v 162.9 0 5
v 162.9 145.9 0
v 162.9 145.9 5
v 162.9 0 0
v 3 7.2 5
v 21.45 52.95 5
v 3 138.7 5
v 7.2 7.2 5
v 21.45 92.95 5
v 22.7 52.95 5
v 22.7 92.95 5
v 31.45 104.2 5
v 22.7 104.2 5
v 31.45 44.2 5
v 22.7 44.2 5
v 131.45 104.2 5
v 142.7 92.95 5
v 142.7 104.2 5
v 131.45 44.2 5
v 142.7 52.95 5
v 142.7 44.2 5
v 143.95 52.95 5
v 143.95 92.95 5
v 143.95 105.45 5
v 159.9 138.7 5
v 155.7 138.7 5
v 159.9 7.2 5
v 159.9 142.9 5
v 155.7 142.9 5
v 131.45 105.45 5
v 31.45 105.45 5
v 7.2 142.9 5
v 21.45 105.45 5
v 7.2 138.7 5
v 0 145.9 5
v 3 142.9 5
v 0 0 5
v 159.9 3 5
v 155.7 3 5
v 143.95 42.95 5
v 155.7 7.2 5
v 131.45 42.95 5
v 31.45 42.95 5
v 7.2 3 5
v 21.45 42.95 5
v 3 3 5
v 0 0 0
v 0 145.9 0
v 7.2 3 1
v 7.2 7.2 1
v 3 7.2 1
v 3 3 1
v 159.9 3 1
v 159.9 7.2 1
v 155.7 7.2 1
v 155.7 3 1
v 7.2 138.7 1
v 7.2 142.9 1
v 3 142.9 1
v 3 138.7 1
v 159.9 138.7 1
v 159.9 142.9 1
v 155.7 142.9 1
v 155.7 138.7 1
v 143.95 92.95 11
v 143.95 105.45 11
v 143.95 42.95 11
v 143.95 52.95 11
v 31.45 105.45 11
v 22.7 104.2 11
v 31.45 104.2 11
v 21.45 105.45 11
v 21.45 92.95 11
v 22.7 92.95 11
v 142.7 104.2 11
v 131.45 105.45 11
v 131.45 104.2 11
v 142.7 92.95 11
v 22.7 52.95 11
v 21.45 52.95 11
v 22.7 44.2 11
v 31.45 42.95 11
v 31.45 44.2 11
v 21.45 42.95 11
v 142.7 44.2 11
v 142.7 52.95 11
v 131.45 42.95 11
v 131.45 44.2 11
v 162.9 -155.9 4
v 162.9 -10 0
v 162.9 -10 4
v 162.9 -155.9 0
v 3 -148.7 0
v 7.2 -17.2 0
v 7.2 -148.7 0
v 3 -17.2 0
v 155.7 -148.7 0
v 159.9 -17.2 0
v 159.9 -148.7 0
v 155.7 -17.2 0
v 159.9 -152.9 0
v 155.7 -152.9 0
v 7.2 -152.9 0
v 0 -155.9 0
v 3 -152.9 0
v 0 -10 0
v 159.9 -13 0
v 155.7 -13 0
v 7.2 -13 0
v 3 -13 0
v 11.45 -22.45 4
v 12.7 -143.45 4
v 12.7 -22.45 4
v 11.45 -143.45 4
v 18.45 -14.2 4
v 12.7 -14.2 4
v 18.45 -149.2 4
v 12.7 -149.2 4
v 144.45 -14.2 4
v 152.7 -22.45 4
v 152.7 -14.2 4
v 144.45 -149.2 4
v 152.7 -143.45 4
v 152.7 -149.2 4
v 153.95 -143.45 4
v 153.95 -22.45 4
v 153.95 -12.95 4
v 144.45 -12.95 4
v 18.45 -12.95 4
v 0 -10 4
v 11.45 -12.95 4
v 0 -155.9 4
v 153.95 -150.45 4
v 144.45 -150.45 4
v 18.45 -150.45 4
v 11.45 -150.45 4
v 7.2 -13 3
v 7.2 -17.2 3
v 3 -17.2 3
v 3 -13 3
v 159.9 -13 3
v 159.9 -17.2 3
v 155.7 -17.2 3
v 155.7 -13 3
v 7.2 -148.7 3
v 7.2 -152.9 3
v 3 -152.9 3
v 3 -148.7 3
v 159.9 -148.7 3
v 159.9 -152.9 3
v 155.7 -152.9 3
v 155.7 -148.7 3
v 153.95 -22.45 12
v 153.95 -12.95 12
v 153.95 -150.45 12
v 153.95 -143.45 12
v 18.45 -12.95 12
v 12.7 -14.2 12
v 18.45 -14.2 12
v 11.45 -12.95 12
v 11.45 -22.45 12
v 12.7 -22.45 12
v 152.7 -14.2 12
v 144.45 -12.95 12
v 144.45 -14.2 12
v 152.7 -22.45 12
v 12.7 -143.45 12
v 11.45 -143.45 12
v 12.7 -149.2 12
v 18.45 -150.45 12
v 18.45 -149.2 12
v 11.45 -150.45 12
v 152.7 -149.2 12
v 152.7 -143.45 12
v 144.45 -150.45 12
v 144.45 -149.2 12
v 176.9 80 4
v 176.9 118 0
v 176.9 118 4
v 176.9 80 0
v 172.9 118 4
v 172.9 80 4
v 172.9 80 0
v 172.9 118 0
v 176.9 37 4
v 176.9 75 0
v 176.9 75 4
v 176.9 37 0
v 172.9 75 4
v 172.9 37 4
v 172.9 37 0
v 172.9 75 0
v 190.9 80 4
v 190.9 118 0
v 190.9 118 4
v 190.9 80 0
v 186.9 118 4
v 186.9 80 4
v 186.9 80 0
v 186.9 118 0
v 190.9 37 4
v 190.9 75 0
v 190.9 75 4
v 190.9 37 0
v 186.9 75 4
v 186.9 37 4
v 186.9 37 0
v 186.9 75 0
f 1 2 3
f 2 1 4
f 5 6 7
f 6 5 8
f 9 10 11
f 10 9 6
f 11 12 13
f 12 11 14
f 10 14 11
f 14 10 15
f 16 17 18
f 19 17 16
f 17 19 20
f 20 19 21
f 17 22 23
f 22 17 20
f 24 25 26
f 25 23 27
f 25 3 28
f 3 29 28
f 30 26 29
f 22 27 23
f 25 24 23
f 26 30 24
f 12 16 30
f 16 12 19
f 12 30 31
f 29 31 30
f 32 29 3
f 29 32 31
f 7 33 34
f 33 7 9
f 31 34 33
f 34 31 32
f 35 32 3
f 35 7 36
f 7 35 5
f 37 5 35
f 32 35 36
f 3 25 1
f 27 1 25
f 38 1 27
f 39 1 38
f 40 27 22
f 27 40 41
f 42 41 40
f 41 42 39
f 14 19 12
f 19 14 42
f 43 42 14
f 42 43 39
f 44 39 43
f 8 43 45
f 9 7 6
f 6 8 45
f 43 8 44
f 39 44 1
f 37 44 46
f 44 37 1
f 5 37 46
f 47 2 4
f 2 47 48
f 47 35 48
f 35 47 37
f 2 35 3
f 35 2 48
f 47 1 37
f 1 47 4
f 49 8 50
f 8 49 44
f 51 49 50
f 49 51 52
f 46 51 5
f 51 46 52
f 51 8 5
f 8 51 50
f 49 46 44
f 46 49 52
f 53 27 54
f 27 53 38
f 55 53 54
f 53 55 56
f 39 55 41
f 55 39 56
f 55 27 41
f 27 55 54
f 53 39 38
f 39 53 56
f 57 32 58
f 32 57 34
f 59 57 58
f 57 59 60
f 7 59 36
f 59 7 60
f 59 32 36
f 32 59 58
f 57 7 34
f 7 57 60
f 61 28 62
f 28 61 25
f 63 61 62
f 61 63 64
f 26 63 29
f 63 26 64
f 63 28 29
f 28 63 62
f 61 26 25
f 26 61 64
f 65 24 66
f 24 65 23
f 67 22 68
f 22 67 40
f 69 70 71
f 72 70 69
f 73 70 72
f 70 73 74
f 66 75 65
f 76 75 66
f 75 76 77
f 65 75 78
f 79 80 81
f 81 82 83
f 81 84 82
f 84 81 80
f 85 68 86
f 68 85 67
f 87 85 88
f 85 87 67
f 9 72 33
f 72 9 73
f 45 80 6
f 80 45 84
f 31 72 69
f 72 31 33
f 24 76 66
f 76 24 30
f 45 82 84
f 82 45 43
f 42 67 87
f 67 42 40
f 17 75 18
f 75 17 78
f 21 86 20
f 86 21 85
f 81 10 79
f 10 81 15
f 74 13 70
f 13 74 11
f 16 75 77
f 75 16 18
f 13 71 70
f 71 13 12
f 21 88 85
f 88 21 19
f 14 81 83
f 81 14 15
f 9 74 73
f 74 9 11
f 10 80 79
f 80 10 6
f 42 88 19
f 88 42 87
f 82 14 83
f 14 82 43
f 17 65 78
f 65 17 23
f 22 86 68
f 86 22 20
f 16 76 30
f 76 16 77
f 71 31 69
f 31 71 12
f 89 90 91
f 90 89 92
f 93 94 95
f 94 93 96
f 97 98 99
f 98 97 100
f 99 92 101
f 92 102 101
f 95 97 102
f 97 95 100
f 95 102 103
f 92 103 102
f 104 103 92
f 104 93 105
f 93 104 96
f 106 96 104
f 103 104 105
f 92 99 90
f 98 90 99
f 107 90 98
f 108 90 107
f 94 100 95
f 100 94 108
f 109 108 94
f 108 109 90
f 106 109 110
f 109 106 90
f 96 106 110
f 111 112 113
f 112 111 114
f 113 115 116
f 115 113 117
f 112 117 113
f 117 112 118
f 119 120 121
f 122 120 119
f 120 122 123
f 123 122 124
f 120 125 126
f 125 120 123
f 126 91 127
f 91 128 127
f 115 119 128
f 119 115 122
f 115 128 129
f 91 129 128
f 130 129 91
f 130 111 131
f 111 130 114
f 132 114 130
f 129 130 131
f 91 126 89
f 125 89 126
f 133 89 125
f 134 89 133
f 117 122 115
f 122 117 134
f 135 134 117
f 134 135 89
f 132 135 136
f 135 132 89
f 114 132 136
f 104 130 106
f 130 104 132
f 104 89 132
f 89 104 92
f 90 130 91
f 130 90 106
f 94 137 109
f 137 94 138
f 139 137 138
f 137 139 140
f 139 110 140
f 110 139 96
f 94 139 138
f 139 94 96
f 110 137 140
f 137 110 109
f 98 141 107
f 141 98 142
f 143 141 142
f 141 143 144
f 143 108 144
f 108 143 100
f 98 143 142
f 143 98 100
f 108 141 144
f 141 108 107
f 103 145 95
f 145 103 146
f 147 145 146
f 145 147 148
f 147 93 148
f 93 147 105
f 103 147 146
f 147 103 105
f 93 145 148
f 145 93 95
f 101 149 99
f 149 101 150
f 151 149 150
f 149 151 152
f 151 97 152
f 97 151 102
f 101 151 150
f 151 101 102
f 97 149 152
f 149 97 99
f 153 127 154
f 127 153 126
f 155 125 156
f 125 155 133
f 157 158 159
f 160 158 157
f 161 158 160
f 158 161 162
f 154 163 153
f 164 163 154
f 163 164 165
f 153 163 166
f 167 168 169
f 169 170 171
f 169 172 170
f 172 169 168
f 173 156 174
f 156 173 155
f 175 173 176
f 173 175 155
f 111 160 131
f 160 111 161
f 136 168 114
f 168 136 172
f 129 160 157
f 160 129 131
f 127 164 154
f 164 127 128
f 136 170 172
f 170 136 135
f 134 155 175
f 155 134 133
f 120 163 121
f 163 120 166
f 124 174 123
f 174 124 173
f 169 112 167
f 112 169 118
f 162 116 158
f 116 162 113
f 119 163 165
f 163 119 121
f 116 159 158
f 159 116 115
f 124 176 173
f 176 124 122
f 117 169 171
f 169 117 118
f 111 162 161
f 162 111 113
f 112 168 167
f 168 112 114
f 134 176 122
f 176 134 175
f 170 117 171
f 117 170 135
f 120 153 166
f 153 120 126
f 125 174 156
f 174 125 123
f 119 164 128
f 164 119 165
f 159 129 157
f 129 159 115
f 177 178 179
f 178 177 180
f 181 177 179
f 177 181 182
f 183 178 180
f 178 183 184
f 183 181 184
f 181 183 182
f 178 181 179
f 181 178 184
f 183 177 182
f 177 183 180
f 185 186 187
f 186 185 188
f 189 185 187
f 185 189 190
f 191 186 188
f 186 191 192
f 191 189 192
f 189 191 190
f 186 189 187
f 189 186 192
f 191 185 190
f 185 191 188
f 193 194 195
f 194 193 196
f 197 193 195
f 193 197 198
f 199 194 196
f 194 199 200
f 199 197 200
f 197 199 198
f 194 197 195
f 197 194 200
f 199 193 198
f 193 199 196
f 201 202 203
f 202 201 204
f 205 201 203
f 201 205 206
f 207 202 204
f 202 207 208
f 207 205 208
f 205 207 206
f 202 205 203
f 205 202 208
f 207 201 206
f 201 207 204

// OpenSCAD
// Brian's Micro Shelving

// Pick which parts to create
part = "all";  // [all:All,base:Base,top_shelf:Top Shelf,legs:Legs]
retaining_wall_width = 1.25;

/* [Base Shelf and Device Dimensions] */
// Base Shelf Device Width
bd_width = 120;
// Base Shelf Device Depth
bd_depth = 60;
// Base Shelf Device Height
bd_height = 30;
// Base Shelf Device Retaining Wall (true or false)
bd_retaining_wall = 0; //[0:True,1:False]
// Base Shelf Device Retaining Wall Length
bd_retaining_wall_length = 10;
// Base Shelf Device Retaining Wall Height
bd_retaining_wall_height = 6;

/* [Top shelf and Device Dimensions] */
// Top shelf Device Width
tsd_width = 140;
// Top shelf Device Depth
tsd_depth = 135;
// Top shelf Device Height
tsd_height =  25;
// Top shelf Device Retaining Wall
tsd_retaining_wall = 0; //[0:True,1:False]
// Top shelf Device Retaining Wall Length
tsd_retaining_wall_length = 7; //Retaining Wall Length
// Top shelf Device Retaining Wall Height
tsd_retaining_wall_height = 8;  //Retaining Wall Height 


/* [Hidden] */
leg_x = 4;
leg_y = 4;
leg_hole_x = leg_x + .2;
leg_hole_y = leg_x + .2;
leg_hole_border = 3;
base_z = 5;
base_x = ((max(bd_width, tsd_width) + (leg_hole_x * 2) + (leg_hole_border * 4) + (retaining_wall_width * 2)));
base_y = ((max(bd_depth, tsd_depth) + (leg_hole_y * 2) + (retaining_wall_width * 2)));
leg_z = bd_height + 8;


print_micro_shelf();


module print_micro_shelf(){
if (part == "all"){
        // Print base, Shelf, and legs
        print_all();
    } else if (part == "base"){
        // Print base
        print_base();
    } else if (part == "top_shelf"){
        // Print top shelf
        print_topshelf();
    } else if (part == "legs") {
        // Print legs
        print_legs();
    } else {
        // all Parts
        print_all();
    }
}


module print_all(){
    base();
    topshelf();
    legs();
}

module print_base(){
    base();
}

module print_topshelf(){
    topshelf();
}

module print_legs(){
    legs();
}

module base(){
    // Base
    shelf(base_x, base_y, base_z);
    if (bd_retaining_wall == 0) {translate([((base_x - bd_width)/2),((base_y - bd_depth)/2),base_z]) retaining_wall(bd_retaining_wall_height, bd_retaining_wall_length, bd_width, bd_depth);}
}

module topshelf(){
    // Top shelf
    rotate([180,0,0]) translate([0,10,(-base_z+1)]) shelf(base_x, base_y, (base_z-1));
    if (tsd_retaining_wall == 0) {translate([((base_x - tsd_width)/2),(((base_y - tsd_depth)/2)- (base_y+10)) , (base_z-1)]) retaining_wall(tsd_retaining_wall_height, tsd_retaining_wall_length, tsd_width, tsd_depth);}
    }


module legs(){
    //legs
    translate([(base_x + 10), 80, 0]) cube ([leg_x, leg_z, leg_y]);
    translate([(base_x + 10), (80 + (-5 - leg_z)), 0]) cube ([leg_x, leg_z, leg_y]);
    translate([(base_x + 24), 80, 0]) cube ([leg_x, leg_z, leg_y]);
    translate([(base_x + 24), (80 + (-5 - leg_z)), 0]) cube ([leg_x, leg_z, leg_y]);
}


// Shelf 
module shelf(shelf_x, shelf_y, shelf_z){
leg_hole_z = shelf_z - 1;
difference(){
cube([shelf_x, shelf_y, shelf_z]);
translate([leg_hole_border, leg_hole_border, (shelf_z - leg_hole_z)]) 
    cube([leg_hole_x, leg_hole_y, (leg_hole_z)]);    
translate([(shelf_x - leg_hole_x - leg_hole_border),leg_hole_border, (shelf_z - leg_hole_z)]) 
    cube([leg_hole_x, leg_hole_y, (leg_hole_z)]);    
translate([leg_hole_border,(base_y - leg_hole_y - leg_hole_border), (shelf_z - leg_hole_z)]) 
    cube([leg_hole_x, leg_hole_y, (leg_hole_z)]);    
translate([(shelf_x - leg_hole_x - leg_hole_border), (shelf_y - leg_hole_y - leg_hole_border), (shelf_z - leg_hole_z)])
    cube([leg_hole_x, leg_hole_y, (leg_hole_z)]);    
   }
}


// Retaining wall
module retaining_wall(rw_height, border, device_x, device_y){    
  difference(){
    cube([(device_x+(2*retaining_wall_width)), (device_y+(2*retaining_wall_width)), rw_height]);
    translate([retaining_wall_width,retaining_wall_width,0]) cube([device_x, device_y, (rw_height+5)]);
    translate([0,border,0]) cube([retaining_wall_width,(device_y - (2*border)),rw_height]);
    translate([border,0,0]) cube([(device_x - (2*border)), retaining_wall_width, rw_height]); 
    translate([(device_x+retaining_wall_width),border,0]) cube([retaining_wall_width,(device_y - (2*border)),rw_height]);  
    translate([border,(device_y+retaining_wall_width),0]) cube([(device_x - (2*border)), retaining_wall_width, rw_height]); 
  }
}
